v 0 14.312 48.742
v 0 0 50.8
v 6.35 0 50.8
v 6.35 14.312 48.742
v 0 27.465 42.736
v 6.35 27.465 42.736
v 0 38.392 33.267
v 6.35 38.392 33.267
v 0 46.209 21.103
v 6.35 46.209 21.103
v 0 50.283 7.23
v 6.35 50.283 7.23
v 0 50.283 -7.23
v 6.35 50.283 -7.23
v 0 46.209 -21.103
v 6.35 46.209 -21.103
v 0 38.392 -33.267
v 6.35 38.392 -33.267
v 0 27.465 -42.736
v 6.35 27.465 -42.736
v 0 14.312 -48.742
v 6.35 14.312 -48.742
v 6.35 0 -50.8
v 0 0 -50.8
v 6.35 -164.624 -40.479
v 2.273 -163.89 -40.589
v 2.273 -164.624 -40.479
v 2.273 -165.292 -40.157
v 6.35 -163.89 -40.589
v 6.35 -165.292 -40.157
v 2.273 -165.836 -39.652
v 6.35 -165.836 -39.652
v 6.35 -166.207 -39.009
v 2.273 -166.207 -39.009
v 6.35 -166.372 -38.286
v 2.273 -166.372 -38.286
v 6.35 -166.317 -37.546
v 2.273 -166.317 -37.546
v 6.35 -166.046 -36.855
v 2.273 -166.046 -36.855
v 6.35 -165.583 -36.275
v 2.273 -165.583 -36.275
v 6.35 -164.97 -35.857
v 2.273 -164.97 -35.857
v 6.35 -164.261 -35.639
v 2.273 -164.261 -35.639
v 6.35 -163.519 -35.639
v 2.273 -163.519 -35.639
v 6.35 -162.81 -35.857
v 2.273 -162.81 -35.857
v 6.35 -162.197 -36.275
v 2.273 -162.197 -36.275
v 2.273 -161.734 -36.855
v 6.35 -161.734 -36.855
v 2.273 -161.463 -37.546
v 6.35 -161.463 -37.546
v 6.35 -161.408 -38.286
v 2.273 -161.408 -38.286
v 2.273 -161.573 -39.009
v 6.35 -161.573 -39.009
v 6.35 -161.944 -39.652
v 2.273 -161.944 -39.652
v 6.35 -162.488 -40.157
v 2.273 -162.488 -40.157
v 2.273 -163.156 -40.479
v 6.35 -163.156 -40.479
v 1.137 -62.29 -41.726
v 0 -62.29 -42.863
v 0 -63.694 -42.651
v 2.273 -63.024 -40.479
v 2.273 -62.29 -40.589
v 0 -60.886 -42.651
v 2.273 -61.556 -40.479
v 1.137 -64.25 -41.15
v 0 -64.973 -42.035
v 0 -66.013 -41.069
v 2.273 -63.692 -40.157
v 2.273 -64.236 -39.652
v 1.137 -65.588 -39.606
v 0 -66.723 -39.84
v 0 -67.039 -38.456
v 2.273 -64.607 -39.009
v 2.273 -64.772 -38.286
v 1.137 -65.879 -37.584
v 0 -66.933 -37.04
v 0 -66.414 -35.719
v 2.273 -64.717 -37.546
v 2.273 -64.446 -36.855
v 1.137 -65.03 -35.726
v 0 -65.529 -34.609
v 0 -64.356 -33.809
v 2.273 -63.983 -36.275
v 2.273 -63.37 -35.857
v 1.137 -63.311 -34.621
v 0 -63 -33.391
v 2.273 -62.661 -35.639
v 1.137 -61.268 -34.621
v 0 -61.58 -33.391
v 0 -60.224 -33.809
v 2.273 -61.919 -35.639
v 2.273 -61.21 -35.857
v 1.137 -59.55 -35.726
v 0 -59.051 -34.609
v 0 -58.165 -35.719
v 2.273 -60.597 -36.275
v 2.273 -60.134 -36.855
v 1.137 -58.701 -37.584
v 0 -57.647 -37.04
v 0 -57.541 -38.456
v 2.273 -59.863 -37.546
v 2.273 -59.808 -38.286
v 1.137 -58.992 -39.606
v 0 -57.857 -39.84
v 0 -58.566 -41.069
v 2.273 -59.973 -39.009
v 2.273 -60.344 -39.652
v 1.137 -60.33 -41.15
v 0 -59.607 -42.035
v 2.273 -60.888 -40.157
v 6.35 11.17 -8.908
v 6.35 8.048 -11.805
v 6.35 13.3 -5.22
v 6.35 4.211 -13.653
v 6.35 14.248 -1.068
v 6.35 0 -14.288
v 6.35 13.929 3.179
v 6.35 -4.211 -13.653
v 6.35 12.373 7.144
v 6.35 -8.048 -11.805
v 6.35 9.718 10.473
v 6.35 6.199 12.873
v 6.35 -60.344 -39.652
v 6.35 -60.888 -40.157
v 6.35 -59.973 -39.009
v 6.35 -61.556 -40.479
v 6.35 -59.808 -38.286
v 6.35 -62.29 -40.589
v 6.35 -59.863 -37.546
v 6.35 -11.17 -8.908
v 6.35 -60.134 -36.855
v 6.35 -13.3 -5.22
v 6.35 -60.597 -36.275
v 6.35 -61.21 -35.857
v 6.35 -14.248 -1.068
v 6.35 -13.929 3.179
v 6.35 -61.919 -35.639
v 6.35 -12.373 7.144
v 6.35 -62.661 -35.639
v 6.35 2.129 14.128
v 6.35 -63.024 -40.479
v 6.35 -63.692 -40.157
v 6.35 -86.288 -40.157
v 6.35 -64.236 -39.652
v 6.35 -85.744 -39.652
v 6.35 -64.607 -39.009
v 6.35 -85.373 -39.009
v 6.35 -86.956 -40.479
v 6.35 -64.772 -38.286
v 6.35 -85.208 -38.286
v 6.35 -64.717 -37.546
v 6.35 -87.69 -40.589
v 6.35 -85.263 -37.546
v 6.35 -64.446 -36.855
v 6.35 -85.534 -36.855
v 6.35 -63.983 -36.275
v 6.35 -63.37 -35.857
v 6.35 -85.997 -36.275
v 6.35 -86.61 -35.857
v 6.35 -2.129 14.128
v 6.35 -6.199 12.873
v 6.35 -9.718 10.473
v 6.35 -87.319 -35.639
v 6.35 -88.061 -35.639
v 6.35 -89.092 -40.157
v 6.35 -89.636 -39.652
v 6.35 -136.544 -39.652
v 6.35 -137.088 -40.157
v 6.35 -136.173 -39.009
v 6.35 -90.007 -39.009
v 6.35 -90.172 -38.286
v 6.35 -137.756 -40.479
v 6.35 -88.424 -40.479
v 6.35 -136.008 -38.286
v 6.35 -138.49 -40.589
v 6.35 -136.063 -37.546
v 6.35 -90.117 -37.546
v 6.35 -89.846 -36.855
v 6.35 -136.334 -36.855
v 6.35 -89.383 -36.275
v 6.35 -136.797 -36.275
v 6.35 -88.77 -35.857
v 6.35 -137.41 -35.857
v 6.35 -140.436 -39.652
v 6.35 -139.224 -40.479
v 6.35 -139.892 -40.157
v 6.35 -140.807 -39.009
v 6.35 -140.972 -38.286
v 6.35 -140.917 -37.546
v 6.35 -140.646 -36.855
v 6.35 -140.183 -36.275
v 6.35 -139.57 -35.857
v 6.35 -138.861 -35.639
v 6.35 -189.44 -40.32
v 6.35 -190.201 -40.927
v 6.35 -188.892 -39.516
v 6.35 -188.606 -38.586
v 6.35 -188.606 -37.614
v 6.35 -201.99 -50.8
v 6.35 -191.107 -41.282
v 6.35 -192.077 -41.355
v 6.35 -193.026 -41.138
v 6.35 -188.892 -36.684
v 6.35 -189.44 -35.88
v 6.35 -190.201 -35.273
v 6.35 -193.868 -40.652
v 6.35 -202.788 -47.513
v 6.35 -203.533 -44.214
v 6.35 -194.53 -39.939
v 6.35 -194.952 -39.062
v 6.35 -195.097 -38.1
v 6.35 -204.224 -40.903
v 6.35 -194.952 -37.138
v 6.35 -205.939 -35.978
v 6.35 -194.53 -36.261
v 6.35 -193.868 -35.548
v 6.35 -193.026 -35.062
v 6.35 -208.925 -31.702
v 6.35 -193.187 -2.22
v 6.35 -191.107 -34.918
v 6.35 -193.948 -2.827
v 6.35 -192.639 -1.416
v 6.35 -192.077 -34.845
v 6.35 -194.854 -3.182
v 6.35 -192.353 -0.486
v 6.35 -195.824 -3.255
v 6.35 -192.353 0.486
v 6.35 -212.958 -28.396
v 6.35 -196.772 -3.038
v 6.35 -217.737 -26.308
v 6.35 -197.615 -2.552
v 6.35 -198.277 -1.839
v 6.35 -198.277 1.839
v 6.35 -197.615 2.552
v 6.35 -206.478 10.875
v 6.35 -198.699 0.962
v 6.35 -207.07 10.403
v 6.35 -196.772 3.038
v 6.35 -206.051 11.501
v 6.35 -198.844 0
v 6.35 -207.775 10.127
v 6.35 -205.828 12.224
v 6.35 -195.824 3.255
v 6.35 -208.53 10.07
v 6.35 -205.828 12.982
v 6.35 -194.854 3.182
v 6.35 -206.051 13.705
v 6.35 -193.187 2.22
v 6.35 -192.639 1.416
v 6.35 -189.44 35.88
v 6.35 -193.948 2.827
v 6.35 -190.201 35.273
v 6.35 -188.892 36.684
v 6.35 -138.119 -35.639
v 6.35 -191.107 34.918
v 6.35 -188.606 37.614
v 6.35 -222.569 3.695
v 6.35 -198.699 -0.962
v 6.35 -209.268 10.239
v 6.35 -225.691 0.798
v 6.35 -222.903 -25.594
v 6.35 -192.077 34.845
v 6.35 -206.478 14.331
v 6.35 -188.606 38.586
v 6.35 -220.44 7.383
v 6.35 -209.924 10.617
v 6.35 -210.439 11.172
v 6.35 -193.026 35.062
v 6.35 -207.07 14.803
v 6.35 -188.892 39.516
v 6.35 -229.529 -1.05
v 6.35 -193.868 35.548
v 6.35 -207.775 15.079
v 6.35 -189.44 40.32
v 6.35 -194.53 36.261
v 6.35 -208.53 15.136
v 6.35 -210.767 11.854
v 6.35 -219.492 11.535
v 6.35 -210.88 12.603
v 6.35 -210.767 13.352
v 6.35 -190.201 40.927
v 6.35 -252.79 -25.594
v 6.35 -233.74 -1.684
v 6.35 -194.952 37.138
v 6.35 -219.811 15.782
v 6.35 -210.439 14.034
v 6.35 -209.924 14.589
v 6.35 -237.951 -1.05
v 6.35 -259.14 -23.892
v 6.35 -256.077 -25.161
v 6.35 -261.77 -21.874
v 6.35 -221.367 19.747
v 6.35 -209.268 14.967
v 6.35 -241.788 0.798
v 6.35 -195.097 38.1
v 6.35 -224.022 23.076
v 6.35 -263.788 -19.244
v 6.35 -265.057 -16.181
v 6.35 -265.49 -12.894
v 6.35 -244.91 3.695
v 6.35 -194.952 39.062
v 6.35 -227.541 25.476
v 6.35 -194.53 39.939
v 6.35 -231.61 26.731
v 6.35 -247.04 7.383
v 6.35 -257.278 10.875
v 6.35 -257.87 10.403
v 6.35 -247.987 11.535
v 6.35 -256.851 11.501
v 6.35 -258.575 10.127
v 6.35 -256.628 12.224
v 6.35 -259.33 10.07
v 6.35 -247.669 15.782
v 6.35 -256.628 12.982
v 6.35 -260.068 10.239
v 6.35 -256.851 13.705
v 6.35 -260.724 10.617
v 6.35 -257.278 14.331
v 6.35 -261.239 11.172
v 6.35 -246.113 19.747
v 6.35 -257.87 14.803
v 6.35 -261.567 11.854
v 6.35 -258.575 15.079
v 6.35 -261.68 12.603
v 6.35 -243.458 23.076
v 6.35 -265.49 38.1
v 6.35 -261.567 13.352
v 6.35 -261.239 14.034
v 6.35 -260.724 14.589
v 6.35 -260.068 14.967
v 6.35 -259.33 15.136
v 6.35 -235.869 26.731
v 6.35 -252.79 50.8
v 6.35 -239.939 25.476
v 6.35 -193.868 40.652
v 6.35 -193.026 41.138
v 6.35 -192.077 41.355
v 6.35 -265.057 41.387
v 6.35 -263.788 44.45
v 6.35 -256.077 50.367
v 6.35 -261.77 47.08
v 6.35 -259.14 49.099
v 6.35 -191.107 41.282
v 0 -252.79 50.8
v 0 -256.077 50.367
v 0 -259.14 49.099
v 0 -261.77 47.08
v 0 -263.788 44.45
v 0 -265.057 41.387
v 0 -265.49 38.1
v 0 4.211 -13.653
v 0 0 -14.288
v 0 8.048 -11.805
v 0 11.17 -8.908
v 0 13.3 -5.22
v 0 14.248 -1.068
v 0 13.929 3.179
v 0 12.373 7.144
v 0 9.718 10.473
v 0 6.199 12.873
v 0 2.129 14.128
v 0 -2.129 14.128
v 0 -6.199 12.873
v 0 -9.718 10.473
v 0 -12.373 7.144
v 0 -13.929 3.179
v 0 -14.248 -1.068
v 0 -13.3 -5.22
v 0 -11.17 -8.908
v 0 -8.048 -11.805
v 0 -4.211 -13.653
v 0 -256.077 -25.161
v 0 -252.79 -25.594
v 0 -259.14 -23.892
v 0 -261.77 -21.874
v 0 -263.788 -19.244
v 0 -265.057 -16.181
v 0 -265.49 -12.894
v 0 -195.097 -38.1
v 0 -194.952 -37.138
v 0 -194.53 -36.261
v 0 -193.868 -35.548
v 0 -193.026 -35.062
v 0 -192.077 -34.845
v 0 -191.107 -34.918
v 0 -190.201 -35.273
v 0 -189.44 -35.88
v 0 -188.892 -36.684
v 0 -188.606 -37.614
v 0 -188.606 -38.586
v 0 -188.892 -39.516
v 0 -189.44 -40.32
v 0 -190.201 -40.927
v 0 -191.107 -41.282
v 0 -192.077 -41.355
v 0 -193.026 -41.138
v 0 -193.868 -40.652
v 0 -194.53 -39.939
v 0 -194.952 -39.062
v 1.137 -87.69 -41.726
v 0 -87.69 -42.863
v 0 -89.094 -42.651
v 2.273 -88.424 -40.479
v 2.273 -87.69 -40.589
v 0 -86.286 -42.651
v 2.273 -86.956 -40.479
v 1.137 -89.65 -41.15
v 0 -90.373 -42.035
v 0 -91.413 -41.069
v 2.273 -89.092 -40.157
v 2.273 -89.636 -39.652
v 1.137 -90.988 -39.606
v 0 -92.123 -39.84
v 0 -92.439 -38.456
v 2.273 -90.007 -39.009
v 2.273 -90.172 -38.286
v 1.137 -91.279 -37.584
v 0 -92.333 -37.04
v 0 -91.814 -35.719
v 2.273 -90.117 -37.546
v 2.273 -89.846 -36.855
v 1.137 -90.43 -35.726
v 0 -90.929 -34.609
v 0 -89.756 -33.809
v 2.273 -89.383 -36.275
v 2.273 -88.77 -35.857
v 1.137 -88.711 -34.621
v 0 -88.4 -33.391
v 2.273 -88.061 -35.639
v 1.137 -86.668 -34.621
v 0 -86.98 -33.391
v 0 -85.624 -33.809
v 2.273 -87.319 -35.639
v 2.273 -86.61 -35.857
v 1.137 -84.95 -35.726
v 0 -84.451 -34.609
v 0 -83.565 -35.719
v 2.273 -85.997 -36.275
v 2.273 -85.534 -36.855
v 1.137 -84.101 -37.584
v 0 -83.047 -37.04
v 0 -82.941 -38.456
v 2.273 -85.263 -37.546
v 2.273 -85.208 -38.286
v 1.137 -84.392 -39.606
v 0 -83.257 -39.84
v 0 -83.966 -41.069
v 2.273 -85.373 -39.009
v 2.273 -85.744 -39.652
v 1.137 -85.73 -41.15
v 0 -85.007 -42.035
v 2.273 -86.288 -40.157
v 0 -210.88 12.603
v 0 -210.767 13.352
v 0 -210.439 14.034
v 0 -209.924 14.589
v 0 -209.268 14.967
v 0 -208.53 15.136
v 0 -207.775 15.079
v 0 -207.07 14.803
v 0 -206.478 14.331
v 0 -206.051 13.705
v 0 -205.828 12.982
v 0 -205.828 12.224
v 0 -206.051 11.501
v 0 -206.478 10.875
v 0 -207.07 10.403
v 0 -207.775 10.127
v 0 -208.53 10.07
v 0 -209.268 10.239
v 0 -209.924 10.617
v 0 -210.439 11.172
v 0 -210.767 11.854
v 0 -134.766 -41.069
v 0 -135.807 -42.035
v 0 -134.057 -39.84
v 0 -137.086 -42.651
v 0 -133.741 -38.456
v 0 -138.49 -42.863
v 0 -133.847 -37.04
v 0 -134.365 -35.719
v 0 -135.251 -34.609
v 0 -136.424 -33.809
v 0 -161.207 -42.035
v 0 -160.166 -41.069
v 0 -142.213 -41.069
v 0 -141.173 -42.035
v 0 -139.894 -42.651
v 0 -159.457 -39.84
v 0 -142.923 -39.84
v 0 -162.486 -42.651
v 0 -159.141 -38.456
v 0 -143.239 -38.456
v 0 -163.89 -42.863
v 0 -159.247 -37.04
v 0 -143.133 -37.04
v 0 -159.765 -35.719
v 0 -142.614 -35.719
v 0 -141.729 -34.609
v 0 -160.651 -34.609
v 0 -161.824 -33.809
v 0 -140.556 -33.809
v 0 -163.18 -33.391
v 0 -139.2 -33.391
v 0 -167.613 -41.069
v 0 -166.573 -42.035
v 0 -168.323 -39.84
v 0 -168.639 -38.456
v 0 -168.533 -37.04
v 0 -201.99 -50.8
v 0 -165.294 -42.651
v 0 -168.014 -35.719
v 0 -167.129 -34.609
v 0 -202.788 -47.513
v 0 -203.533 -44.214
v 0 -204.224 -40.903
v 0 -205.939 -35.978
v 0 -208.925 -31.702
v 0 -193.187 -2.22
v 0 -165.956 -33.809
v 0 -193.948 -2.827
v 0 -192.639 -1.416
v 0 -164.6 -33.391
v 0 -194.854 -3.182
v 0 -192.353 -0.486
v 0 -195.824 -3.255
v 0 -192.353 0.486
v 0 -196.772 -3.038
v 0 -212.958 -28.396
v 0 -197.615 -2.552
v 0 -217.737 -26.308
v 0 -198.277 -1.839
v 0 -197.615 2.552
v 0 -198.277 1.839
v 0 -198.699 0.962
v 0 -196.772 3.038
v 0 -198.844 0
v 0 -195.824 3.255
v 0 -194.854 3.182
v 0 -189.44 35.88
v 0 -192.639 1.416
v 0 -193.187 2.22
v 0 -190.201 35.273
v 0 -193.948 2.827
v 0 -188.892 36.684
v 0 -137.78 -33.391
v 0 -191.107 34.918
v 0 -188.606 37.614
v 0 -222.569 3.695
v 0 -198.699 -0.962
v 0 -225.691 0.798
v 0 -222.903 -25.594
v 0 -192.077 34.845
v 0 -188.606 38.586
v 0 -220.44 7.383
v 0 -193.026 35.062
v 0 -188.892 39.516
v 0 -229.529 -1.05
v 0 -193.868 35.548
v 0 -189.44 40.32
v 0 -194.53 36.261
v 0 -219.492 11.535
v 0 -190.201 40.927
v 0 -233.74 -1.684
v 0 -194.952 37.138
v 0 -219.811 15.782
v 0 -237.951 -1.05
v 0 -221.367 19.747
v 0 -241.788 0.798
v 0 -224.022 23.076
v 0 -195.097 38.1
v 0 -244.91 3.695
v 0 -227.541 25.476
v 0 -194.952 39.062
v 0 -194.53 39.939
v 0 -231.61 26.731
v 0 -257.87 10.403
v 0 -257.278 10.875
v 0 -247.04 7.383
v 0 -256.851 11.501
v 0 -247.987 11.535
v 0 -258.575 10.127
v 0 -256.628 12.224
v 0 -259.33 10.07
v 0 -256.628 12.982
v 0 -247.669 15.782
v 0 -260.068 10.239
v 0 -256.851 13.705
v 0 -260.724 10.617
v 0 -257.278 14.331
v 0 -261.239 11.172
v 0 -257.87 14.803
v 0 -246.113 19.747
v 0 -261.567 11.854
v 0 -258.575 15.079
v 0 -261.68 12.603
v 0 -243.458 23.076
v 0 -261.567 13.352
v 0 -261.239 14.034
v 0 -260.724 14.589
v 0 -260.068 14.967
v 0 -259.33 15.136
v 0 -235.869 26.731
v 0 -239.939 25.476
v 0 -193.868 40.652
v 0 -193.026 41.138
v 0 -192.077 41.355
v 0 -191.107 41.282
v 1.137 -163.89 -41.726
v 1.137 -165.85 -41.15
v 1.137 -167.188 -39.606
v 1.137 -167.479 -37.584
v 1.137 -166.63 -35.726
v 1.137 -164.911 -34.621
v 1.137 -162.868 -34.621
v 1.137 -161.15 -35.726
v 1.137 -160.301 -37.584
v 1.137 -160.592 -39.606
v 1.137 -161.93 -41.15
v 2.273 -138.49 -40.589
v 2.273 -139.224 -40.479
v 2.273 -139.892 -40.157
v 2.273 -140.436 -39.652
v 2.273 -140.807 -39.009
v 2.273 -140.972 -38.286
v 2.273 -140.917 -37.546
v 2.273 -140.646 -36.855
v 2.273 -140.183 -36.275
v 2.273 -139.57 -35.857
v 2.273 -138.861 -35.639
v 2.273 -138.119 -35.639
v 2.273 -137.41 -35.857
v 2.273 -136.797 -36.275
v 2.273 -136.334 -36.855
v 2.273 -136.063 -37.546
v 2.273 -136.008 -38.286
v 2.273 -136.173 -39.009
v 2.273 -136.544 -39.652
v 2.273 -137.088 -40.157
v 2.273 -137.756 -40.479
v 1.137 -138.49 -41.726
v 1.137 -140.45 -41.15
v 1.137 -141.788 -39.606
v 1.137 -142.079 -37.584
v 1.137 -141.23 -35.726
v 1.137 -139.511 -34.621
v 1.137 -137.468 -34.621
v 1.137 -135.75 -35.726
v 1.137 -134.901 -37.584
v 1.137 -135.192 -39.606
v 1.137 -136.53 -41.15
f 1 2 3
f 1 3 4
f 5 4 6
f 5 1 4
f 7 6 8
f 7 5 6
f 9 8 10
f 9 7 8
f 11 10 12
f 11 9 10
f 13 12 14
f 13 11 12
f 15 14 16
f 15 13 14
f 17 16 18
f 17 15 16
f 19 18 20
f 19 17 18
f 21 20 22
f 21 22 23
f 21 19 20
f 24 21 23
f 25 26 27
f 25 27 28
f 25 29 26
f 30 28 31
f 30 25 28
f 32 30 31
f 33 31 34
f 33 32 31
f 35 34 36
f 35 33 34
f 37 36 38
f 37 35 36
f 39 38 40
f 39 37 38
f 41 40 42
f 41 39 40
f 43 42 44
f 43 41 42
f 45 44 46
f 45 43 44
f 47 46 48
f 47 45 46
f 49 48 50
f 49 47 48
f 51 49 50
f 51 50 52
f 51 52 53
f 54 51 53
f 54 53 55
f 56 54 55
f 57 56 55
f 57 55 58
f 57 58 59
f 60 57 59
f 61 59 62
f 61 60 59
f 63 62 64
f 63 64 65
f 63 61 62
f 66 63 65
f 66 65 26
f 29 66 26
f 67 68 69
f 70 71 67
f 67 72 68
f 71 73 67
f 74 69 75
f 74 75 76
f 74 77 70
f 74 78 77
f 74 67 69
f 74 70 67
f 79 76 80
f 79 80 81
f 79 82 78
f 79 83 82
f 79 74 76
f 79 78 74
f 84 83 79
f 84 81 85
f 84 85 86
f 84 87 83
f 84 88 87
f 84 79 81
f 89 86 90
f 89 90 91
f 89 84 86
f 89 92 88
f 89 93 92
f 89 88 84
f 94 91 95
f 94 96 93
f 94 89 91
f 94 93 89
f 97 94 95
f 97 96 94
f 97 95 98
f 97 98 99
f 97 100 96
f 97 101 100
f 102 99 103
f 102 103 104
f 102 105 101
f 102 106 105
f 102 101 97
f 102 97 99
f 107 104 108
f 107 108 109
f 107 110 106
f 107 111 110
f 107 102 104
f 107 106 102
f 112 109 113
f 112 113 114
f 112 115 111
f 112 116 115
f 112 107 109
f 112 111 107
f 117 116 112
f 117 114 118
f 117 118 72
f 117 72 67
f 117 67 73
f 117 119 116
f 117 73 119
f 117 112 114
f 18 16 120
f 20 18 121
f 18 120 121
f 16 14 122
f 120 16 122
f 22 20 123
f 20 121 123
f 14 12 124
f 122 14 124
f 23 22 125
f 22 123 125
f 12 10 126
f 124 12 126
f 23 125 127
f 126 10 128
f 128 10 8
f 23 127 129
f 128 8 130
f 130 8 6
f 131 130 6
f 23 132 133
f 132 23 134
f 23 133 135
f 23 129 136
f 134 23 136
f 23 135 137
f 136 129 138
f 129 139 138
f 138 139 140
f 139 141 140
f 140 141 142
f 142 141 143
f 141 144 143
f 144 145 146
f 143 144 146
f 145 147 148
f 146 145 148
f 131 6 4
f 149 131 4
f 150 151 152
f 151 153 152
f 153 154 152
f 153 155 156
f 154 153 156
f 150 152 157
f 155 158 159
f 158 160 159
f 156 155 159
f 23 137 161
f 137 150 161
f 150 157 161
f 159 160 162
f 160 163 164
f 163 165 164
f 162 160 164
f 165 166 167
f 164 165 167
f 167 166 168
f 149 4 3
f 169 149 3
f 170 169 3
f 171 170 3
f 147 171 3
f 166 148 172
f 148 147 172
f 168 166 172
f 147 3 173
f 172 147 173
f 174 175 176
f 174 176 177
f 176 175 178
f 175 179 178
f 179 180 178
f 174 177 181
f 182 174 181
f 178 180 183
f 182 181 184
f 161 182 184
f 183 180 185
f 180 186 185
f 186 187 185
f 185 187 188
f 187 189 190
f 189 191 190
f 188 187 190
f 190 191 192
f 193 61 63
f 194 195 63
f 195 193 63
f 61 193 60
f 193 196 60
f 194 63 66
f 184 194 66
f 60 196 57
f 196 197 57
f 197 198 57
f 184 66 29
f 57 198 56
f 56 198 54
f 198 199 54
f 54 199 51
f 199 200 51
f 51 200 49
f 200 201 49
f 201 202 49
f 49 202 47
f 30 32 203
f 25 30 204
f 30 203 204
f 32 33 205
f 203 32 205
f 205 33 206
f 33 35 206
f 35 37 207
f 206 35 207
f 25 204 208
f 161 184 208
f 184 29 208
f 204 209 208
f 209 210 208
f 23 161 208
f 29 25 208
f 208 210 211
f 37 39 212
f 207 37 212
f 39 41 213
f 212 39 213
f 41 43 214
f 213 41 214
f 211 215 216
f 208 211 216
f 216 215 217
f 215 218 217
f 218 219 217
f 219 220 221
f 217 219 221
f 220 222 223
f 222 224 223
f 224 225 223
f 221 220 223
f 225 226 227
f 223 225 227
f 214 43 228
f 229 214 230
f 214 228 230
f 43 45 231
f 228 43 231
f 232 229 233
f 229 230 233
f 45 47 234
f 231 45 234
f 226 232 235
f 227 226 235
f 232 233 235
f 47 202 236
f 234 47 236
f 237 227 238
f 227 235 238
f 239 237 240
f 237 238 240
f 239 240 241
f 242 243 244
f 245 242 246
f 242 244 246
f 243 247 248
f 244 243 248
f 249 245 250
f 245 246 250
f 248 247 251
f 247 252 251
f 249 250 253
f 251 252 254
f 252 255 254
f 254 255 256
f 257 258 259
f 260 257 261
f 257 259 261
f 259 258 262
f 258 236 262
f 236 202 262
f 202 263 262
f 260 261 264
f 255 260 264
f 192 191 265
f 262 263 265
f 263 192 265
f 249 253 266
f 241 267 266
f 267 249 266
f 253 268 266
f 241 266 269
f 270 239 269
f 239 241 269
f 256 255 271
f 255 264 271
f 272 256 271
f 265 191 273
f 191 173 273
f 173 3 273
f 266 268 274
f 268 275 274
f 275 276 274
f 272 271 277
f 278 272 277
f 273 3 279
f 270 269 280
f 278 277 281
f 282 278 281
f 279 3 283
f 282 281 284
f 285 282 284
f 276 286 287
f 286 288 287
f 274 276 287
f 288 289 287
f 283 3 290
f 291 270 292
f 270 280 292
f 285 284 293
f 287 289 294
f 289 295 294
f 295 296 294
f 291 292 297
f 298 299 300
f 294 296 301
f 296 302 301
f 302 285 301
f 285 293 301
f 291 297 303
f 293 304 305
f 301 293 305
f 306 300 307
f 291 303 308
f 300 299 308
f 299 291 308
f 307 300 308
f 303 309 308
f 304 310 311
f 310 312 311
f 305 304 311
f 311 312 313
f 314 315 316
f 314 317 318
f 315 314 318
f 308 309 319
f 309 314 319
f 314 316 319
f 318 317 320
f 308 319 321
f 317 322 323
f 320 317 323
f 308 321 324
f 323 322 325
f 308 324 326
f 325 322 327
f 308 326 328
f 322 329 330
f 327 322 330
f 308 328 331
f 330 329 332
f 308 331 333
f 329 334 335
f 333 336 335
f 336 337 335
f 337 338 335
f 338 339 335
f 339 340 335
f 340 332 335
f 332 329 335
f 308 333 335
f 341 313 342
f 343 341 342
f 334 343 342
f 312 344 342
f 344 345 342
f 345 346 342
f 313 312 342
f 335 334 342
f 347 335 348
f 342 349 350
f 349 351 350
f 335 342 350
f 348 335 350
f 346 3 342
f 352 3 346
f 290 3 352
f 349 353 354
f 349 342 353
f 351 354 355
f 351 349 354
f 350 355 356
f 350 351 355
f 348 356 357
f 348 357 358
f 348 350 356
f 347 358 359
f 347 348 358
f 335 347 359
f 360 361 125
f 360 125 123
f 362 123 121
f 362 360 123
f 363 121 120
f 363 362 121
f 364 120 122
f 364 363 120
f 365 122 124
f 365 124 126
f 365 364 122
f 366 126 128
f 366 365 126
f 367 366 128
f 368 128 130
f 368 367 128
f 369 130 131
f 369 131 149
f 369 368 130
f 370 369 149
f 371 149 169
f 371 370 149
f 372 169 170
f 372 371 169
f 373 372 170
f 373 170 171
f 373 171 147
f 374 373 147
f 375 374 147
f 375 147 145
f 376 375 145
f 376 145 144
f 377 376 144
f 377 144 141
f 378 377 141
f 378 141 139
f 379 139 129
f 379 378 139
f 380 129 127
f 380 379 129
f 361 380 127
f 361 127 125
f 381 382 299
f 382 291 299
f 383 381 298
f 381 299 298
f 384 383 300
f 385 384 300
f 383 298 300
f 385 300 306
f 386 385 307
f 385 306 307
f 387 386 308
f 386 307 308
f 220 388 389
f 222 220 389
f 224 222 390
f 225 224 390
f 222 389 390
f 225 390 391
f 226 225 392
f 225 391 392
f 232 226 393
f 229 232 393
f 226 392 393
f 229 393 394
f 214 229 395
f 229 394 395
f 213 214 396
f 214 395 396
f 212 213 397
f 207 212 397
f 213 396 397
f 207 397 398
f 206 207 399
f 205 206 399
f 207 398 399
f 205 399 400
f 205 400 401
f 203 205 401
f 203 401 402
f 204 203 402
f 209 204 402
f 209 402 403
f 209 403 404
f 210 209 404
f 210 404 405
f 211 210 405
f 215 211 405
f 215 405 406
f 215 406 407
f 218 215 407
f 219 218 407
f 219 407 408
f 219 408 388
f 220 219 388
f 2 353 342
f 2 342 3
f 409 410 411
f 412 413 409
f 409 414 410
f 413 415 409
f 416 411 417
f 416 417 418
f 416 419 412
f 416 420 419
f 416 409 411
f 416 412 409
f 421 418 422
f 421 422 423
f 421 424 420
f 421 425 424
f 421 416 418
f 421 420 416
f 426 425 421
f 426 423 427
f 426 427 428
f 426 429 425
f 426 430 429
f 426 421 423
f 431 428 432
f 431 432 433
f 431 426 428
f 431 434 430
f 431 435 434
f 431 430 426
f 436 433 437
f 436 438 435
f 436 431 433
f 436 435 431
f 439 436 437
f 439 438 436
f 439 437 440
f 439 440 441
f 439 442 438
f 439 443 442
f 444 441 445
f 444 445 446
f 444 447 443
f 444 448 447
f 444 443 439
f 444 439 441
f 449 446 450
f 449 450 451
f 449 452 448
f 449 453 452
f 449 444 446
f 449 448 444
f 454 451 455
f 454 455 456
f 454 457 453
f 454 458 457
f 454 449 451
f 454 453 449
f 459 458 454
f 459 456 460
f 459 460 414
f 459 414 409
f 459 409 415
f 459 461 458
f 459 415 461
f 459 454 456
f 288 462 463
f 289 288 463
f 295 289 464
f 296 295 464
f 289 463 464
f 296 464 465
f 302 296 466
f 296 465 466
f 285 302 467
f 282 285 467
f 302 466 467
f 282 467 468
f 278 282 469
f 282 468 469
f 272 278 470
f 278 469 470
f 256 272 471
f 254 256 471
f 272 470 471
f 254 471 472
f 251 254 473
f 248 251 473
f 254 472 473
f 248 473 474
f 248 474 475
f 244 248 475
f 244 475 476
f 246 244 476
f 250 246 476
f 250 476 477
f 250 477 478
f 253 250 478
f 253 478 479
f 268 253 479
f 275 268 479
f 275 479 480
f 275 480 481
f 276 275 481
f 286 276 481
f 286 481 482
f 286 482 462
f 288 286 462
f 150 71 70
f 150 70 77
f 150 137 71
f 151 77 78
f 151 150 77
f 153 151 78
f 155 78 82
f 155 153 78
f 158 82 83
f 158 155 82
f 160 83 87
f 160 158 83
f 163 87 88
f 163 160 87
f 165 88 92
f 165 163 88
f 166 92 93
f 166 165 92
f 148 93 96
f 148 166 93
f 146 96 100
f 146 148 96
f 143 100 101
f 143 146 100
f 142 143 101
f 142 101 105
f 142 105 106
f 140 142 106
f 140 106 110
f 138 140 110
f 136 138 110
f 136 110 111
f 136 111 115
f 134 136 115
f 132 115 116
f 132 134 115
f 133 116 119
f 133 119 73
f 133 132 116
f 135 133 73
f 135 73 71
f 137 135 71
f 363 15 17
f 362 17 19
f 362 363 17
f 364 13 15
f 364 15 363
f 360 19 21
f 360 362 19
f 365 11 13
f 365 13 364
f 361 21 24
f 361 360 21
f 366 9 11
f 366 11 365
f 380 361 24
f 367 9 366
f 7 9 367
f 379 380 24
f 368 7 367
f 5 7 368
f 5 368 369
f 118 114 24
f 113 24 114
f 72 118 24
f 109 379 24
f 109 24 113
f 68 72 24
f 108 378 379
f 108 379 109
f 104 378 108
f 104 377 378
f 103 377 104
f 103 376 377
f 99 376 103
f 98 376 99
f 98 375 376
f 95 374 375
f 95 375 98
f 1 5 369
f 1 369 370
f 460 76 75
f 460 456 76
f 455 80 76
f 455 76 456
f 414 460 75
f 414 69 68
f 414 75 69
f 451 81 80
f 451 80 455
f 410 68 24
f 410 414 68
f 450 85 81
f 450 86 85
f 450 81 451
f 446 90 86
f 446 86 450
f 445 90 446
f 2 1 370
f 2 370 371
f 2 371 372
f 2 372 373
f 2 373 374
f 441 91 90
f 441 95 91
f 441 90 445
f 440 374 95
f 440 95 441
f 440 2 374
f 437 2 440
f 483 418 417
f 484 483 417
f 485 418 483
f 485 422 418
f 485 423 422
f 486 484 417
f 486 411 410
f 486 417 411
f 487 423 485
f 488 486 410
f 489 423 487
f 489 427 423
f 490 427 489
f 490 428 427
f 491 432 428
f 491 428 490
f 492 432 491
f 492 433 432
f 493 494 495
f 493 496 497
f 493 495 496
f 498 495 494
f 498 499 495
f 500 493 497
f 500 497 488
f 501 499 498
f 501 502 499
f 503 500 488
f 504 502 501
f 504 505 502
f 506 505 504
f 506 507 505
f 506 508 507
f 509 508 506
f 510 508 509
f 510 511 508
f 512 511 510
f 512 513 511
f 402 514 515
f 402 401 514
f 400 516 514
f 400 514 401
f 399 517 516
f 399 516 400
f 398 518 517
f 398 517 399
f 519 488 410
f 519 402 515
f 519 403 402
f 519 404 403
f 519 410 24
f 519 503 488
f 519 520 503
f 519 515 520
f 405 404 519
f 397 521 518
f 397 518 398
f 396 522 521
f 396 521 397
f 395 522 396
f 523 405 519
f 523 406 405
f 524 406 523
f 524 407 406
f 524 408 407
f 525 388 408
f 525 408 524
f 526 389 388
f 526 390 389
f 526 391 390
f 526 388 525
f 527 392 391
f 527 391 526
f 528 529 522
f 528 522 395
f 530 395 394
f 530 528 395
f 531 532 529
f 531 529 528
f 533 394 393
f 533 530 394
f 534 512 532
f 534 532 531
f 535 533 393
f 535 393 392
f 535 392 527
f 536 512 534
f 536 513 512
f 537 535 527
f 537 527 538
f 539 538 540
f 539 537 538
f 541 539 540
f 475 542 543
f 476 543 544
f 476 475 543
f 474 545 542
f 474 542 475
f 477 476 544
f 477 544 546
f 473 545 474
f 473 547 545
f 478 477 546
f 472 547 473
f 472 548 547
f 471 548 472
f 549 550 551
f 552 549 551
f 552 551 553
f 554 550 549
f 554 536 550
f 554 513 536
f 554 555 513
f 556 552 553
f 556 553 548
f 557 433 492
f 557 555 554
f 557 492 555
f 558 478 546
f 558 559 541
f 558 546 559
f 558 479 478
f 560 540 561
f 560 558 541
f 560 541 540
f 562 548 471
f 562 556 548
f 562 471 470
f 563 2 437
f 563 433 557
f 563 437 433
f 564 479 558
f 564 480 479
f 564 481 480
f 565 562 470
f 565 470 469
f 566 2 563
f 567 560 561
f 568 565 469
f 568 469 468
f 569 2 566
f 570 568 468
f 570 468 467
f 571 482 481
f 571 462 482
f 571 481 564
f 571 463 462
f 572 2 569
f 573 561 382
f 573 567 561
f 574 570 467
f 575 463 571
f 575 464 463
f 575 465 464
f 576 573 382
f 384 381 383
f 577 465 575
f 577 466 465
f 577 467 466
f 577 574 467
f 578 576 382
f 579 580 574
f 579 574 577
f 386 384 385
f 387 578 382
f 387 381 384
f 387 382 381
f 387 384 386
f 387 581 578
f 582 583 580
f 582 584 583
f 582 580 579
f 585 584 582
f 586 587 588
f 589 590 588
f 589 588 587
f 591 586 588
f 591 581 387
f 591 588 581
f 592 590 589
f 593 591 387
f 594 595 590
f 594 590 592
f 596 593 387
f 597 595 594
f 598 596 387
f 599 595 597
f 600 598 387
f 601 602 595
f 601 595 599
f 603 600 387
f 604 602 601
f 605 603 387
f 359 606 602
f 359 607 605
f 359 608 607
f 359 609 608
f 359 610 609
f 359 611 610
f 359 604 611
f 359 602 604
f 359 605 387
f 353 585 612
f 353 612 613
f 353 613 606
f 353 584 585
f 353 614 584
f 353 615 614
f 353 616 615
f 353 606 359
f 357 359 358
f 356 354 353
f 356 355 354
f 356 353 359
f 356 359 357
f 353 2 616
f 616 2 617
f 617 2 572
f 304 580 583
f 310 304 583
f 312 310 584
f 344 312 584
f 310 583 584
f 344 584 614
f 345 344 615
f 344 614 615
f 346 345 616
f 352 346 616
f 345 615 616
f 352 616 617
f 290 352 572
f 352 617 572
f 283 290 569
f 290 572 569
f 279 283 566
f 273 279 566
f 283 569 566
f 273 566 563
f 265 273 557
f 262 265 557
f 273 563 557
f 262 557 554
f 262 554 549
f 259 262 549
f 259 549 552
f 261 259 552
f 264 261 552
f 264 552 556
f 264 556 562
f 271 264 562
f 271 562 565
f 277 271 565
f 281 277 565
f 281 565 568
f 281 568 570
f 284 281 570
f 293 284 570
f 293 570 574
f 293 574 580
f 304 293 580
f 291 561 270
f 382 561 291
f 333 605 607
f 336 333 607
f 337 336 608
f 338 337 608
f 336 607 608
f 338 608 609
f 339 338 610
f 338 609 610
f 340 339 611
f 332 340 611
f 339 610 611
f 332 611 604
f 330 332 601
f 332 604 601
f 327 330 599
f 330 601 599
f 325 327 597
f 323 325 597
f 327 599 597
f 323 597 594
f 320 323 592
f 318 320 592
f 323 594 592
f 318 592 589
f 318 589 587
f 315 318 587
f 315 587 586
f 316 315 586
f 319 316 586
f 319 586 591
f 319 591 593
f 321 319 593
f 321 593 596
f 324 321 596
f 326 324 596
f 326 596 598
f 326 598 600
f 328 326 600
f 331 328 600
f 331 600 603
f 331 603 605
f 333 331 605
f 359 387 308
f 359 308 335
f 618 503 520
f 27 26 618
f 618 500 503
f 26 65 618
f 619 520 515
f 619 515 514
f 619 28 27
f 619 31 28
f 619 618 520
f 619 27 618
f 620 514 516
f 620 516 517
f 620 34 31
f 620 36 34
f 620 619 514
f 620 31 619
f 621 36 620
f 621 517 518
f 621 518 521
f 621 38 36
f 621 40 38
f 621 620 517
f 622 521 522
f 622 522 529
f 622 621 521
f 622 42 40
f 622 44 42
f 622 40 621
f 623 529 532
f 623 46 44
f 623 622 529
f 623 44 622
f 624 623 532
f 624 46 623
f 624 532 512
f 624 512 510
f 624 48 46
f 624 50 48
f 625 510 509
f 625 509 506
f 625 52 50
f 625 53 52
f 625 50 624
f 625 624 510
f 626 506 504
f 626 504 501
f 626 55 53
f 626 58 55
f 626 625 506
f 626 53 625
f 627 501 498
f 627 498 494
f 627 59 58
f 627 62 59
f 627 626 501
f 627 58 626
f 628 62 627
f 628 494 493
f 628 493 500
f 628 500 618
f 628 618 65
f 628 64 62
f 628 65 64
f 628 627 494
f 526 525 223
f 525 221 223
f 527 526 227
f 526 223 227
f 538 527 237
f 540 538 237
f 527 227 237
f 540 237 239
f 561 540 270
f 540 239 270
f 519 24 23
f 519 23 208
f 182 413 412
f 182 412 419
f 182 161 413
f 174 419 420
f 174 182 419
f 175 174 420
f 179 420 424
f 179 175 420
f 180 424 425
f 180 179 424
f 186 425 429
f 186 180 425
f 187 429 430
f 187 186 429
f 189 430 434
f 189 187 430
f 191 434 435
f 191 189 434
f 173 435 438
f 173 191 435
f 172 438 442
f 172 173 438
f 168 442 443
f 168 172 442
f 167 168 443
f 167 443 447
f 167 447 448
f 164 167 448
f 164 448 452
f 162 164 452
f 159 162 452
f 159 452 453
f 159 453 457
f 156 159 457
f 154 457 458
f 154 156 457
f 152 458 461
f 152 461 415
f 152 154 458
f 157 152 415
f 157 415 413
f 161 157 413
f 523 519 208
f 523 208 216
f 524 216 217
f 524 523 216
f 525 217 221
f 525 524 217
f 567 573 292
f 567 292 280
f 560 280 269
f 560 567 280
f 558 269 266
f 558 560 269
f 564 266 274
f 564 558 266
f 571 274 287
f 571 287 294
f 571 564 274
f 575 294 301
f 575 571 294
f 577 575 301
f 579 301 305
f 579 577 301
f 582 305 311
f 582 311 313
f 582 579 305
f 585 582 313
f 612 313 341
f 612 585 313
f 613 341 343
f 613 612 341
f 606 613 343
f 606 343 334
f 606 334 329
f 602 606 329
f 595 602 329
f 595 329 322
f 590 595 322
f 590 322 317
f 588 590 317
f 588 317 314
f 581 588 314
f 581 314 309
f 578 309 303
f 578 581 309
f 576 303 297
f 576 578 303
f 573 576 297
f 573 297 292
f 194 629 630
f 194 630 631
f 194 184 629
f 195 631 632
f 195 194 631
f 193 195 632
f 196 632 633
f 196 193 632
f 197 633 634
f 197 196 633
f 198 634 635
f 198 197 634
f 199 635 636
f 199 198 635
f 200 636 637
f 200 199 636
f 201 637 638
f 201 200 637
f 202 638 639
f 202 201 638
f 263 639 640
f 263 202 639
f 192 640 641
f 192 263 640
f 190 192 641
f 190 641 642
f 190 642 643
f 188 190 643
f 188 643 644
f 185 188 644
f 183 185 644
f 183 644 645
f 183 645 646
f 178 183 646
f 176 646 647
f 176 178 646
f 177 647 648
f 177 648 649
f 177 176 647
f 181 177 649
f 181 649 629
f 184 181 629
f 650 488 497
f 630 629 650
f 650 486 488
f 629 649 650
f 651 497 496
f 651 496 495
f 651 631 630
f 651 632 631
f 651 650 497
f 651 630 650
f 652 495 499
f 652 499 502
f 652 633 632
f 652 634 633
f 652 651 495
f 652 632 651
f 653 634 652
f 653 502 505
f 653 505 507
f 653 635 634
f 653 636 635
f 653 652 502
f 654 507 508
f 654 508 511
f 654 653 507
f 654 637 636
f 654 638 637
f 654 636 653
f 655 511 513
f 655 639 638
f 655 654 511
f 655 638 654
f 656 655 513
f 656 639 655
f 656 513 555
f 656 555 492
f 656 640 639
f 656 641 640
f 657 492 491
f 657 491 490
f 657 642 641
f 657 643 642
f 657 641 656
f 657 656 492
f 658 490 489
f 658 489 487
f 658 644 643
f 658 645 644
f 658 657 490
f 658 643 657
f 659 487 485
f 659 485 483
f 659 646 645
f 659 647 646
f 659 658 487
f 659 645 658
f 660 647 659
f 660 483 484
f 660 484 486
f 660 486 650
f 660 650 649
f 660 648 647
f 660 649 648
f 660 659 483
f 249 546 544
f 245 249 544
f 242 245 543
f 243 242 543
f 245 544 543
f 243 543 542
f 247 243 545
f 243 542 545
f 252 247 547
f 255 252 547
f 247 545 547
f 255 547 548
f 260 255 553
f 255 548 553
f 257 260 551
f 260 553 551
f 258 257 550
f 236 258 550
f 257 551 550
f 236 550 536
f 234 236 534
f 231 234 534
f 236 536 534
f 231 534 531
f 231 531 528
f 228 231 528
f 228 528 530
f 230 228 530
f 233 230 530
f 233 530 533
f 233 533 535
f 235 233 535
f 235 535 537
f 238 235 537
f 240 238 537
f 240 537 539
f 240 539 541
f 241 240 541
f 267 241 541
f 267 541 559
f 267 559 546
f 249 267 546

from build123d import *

# Parameters (mm, degrees)
SKETCH1_R                           = 14.2875
BOSS_EXTRUDE1_DEPTH                 = 6.35
F_0_257_DIAMETER_HOLE1_D            = 6.5278
F_9_0_2_DIAMETER_HOLE1_D            = 5.08
FILLET2_R                           = 12.7
FILLET1_R                           = 19.05
F_9_0_196_DIAMETER_HOLE1_AT_2_COUNT = 2
F_9_0_196_DIAMETER_HOLE1_AT_2_PITCH = 25.4
F_9_0_196_DIAMETER_HOLE1_AT_3_COUNT = 2
F_9_0_196_DIAMETER_HOLE1_AT_3_PITCH = 76.2
F_9_0_196_DIAMETER_HOLE1_AT_4_COUNT = 2
F_9_0_196_DIAMETER_HOLE1_AT_4_PITCH = 101.6


with BuildPart() as part:
    # Sketch1 → Boss-Extrude1 (new body)
    with BuildSketch(Plane.YZ):
        with BuildLine():
            Line((0, -50.8), (-201.989896777, -50.8))
            ThreePointArc((-201.989896777, -50.8), (-204.733971085, -38.269563411), (-206.701492618, -25.593970963))
            Line((-206.701492618, -25.593970963), (-265.489896777, -25.593970963))
            Line((-265.489896777, -25.593970963), (-265.489896777, 50.8))
            Line((-265.489896777, 50.8), (-201.989896777, 50.8))
            Line((-201.989896777, 50.8), (0, 50.8))
            ThreePointArc((0, 50.8), (50.8, 0), (0, -50.8))
        make_face()
        with Locations(Location((0, 0, 0), (0, 0, 270))):
            Circle(SKETCH1_R, mode=Mode.SUBTRACT)
        with Locations(Location((-233.739896777, 12.603014519, 0), (0, 0, 270))):
            Circle(SKETCH1_R, mode=Mode.SUBTRACT)
    extrude(amount=BOSS_EXTRUDE1_DEPTH)

    # F (0.257) Diameter Hole1 (through all)
    with Locations(Plane.YZ.offset(6.35)):
        with Locations((0, 0), (-191.833069099, -38.1), (-195.58, 0), (-191.833069099, 38.1)):
            Hole(F_0_257_DIAMETER_HOLE1_D / 2)

    # #9 (0.2) Diameter Hole1 (through all)
    with Locations(Plane.YZ.offset(6.35)):
        with Locations((-259.139896777, 12.603014519), (-208.339896777, 12.603014519)):
            Hole(F_9_0_2_DIAMETER_HOLE1_D / 2)

    # Fillet2
    fillet2_edges = [part.edges().sort_by_distance(p)[0] for p in [
        (3.175, -265.489896777, -25.593970963),
        (3.175, -265.489896777, 50.8),
    ]]
    fillet(fillet2_edges, radius=FILLET2_R)

    # Fillet1
    fillet1_edges = [part.edges().sort_by_distance(p)[0] for p in [
        (3.175, -206.701492618, -25.593970963),
    ]]
    fillet(fillet1_edges, radius=FILLET1_R)

    # Sketch9 → #9 (0.196) Diameter Hole1 (revolve, cut)
    with BuildSketch(Plane(origin=(6.35, -163.889896777, -38.1), x_dir=(0, 0, -1), z_dir=(0, 1, 0))):
        Polygon((0, 0), (0, 6.35), (4.7625, 6.35), (2.4892, 4.0767), (2.4892, 0), align=None)
    f_9_0_196_diameter_hole1 = revolve(axis=Axis((12.7, -163.889896777, -38.1), (-1, 0, 0)), mode=Mode.SUBTRACT)

    # #9 (0.196) Diameter Hole1 at 2: #9 (0.196) Diameter Hole1 ×2
    with Locations(*[(0, i * F_9_0_196_DIAMETER_HOLE1_AT_2_PITCH, 0) for i in range(1, F_9_0_196_DIAMETER_HOLE1_AT_2_COUNT)]):
        add(f_9_0_196_diameter_hole1, mode=Mode.SUBTRACT)

    # #9 (0.196) Diameter Hole1 at 3: #9 (0.196) Diameter Hole1 ×2
    with Locations(*[(0, i * F_9_0_196_DIAMETER_HOLE1_AT_3_PITCH, 0) for i in range(1, F_9_0_196_DIAMETER_HOLE1_AT_3_COUNT)]):
        add(f_9_0_196_diameter_hole1, mode=Mode.SUBTRACT)

    # #9 (0.196) Diameter Hole1 at 4: #9 (0.196) Diameter Hole1 ×2
    with Locations(*[(0, i * F_9_0_196_DIAMETER_HOLE1_AT_4_PITCH, 0) for i in range(1, F_9_0_196_DIAMETER_HOLE1_AT_4_COUNT)]):
        add(f_9_0_196_diameter_hole1, mode=Mode.SUBTRACT)


solid = part.part
